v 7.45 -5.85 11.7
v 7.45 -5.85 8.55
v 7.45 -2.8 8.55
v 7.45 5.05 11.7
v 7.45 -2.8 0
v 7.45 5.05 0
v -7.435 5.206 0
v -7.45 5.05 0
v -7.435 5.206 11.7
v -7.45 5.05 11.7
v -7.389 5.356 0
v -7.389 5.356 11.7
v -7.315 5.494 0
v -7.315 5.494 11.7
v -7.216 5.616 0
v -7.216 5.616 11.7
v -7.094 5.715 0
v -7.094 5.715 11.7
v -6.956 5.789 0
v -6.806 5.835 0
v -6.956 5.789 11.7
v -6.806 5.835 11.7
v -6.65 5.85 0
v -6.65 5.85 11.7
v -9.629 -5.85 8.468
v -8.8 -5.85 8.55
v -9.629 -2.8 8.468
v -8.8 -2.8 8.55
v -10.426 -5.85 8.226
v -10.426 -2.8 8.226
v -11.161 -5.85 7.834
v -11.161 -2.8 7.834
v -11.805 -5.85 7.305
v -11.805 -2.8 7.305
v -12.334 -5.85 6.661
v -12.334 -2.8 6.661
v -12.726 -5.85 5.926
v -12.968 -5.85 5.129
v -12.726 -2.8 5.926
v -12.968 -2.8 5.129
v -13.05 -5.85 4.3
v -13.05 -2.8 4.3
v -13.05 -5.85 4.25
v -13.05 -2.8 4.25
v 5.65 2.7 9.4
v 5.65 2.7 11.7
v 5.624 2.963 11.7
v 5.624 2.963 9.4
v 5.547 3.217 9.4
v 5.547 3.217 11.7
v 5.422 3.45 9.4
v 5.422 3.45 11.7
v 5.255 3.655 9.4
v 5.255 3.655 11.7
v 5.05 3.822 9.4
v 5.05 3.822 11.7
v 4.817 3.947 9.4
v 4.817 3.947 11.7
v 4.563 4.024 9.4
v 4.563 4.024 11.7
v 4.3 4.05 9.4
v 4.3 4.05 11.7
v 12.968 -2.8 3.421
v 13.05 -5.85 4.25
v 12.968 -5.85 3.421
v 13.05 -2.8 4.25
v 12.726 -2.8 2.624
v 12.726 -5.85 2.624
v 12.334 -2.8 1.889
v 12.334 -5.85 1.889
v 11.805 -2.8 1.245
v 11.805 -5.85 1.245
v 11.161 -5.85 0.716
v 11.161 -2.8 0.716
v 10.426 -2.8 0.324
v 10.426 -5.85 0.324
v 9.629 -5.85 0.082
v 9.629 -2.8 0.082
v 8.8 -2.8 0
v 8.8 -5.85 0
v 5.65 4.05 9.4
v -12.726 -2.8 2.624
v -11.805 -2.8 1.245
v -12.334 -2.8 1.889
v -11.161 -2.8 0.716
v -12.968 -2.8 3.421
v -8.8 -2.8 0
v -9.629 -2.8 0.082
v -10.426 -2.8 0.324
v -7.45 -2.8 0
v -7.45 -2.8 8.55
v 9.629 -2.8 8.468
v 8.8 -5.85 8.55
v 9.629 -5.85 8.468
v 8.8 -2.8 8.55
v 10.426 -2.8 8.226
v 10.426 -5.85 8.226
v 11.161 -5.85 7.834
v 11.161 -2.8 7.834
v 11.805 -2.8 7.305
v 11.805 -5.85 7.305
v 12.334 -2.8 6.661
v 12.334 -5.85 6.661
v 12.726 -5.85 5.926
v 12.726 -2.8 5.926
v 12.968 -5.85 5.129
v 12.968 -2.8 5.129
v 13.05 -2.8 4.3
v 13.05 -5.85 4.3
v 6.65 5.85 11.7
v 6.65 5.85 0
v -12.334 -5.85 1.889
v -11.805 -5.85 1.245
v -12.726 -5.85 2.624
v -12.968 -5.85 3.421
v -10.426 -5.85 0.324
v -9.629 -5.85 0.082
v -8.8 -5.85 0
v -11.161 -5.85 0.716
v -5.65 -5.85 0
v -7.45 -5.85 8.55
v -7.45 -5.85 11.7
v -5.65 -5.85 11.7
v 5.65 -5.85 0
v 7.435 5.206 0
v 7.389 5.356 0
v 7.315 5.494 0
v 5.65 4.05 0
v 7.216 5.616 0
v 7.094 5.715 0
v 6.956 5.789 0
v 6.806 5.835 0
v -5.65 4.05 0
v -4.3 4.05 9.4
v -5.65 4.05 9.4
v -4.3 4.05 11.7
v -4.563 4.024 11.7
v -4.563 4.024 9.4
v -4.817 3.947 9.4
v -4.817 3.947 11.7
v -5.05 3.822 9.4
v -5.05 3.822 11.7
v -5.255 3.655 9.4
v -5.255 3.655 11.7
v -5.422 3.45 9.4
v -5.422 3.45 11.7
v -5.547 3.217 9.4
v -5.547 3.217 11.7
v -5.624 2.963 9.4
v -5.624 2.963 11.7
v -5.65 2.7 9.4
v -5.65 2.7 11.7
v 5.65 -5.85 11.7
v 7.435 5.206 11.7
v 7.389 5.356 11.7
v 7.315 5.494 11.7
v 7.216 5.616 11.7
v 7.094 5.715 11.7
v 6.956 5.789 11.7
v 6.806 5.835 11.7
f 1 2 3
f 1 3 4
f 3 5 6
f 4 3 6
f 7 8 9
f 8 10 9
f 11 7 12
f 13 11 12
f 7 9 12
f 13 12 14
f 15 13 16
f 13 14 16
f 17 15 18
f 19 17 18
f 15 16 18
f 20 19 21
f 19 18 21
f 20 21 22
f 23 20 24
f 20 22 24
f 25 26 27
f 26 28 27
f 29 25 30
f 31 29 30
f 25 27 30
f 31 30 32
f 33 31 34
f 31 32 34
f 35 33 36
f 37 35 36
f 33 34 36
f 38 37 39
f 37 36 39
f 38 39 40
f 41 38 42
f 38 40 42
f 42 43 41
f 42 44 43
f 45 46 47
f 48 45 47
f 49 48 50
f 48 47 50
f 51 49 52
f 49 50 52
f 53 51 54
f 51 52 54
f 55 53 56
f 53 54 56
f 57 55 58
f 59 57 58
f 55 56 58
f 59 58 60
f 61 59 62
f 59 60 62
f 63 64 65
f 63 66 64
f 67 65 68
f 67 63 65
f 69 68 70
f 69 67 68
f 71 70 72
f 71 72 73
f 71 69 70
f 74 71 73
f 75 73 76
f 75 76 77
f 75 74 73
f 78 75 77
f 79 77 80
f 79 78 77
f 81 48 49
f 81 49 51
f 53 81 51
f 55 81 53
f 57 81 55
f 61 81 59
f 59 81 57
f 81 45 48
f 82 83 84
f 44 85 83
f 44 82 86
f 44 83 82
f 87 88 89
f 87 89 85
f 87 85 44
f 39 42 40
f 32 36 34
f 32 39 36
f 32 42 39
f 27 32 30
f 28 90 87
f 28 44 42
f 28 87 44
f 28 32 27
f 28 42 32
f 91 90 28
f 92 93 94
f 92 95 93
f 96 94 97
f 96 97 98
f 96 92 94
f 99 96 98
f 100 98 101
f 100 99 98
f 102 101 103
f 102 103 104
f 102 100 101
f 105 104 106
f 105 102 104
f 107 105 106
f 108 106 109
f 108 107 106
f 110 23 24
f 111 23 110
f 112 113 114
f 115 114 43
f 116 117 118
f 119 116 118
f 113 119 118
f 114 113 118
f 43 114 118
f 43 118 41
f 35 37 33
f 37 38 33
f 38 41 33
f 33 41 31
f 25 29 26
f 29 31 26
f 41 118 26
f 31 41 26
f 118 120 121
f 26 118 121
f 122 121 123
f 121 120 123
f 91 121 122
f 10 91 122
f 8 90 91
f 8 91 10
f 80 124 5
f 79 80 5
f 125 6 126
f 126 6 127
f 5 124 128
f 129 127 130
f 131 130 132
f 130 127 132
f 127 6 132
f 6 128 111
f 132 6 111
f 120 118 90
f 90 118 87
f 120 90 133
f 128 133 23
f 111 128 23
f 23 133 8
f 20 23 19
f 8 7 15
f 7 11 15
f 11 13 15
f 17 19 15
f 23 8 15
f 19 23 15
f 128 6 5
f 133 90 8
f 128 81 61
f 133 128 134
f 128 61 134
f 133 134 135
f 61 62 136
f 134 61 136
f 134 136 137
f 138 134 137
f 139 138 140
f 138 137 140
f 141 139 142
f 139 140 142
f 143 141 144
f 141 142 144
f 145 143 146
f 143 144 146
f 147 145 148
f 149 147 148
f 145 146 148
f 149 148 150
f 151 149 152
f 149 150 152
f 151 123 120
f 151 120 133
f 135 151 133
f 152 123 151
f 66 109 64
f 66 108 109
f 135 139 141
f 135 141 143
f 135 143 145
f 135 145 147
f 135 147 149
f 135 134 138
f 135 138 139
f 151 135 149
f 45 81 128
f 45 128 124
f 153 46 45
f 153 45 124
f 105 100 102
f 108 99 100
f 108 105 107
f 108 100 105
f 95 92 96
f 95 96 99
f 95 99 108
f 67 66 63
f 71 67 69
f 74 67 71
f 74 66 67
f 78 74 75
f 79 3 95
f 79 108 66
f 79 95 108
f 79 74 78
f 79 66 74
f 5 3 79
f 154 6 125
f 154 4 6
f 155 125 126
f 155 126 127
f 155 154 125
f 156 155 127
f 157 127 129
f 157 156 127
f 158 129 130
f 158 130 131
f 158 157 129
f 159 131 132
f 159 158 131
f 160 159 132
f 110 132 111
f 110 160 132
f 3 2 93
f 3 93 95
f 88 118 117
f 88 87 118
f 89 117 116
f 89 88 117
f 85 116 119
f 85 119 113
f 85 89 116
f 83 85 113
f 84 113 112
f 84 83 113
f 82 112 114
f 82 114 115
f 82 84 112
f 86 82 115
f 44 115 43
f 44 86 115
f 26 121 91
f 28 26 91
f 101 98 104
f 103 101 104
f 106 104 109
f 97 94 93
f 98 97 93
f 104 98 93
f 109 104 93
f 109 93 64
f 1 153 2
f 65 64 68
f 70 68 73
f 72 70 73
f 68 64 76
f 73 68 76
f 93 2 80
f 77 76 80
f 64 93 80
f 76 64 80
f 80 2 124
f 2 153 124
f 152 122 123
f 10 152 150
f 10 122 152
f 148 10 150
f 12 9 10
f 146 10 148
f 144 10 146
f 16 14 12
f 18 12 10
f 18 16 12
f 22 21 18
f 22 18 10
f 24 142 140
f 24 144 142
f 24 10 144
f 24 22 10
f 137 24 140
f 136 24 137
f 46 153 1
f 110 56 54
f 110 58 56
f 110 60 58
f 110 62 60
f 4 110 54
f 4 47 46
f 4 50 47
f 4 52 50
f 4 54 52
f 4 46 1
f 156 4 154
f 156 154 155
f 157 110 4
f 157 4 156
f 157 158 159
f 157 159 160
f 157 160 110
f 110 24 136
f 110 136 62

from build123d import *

# Parameters (mm, degrees)
SKICA1_W                 = 14.9
SKICA1_H                 = 11.7
P_IDAT_VYSUNUT_M1_DEPTH  = 11.7
ODEBRAT_VYSUNUT_M2_DEPTH = 2.3
ODEBRAT_VYSUNUT_M3_DEPTH = 20
ZAOBLIT2_R               = 0.8
SKICA9_W                 = 8.55
SKICA9_H                 = 3.05
P_IDAT_VYSUNUT_M3_DEPTH  = 5.6
ZAOBLIT3_R               = 4.25
SKICA10_W                = 8.55
SKICA10_H                = 3.05
P_IDAT_VYSUNUT_M4_DEPTH  = 5.6
ZAOBLIT4_R               = 4.25


with BuildPart() as part:
    # Skica1 → Přidat vysunutím1 (new body)
    with BuildSketch(Plane.XY):
        Rectangle(SKICA1_W, SKICA1_H)
    extrude(amount=P_IDAT_VYSUNUT_M1_DEPTH)

    # Skica2 → Odebrat vysunutím2 (cut)
    with BuildSketch(Plane.XY.offset(11.7)):
        with BuildLine():
            Line((-5.65, -5.85), (5.65, -5.85))
            Line((5.65, -5.85), (5.65, 2.7))
            ThreePointArc((5.65, 2.7), (5.254594155, 3.654594155), (4.3, 4.05))
            Line((4.3, 4.05), (-4.3, 4.05))
            ThreePointArc((-4.3, 4.05), (-5.254594155, 3.654594155), (-5.65, 2.7))
            Line((-5.65, 2.7), (-5.65, -5.85))
        make_face()
    extrude(amount=-ODEBRAT_VYSUNUT_M2_DEPTH, mode=Mode.SUBTRACT)

    # Skica5 → Odebrat vysunutím3 (cut)
    with BuildSketch(Plane.XY.offset(9.4)):
        Polygon((-4.3, 4.05), (4.3, 4.05), (5.65, 4.05), (5.65, -5.85), (-5.65, -5.85), (-5.65, 4.05), align=None)
    extrude(amount=-ODEBRAT_VYSUNUT_M3_DEPTH, mode=Mode.SUBTRACT)

    # Zaoblit2
    zaoblit2_edges = [part.edges().sort_by_distance(p)[0] for p in [
        (-7.45, 5.85, 5.85),
        (7.45, 5.85, 5.85),
    ]]
    fillet(zaoblit2_edges, radius=ZAOBLIT2_R)

    # Skica9 → Přidat vysunutím3 (add)
    with BuildSketch(Plane.ZY.offset(7.45)):
        with Locations((4.275, -4.325)):
            Rectangle(SKICA9_W, SKICA9_H)
    extrude(amount=P_IDAT_VYSUNUT_M3_DEPTH)

    # Zaoblit3
    zaoblit3_edges = [part.edges().sort_by_distance(p)[0] for p in [
        (-13.05, -4.325, 0),
        (-13.05, -4.325, 8.55),
    ]]
    fillet(zaoblit3_edges, radius=ZAOBLIT3_R)

    # Skica10 → Přidat vysunutím4 (add)
    with BuildSketch(Plane(origin=(7.45, 0, 0), x_dir=(0, 0, -1), z_dir=(1, 0, 0))):
        with Locations((-4.275, -4.325)):
            Rectangle(SKICA10_W, SKICA10_H)
    extrude(amount=P_IDAT_VYSUNUT_M4_DEPTH)

    # Zaoblit4
    zaoblit4_edges = [part.edges().sort_by_distance(p)[0] for p in [
        (13.05, -4.325, 8.55),
        (13.05, -4.325, 0),
    ]]
    fillet(zaoblit4_edges, radius=ZAOBLIT4_R)


solid = part.part
